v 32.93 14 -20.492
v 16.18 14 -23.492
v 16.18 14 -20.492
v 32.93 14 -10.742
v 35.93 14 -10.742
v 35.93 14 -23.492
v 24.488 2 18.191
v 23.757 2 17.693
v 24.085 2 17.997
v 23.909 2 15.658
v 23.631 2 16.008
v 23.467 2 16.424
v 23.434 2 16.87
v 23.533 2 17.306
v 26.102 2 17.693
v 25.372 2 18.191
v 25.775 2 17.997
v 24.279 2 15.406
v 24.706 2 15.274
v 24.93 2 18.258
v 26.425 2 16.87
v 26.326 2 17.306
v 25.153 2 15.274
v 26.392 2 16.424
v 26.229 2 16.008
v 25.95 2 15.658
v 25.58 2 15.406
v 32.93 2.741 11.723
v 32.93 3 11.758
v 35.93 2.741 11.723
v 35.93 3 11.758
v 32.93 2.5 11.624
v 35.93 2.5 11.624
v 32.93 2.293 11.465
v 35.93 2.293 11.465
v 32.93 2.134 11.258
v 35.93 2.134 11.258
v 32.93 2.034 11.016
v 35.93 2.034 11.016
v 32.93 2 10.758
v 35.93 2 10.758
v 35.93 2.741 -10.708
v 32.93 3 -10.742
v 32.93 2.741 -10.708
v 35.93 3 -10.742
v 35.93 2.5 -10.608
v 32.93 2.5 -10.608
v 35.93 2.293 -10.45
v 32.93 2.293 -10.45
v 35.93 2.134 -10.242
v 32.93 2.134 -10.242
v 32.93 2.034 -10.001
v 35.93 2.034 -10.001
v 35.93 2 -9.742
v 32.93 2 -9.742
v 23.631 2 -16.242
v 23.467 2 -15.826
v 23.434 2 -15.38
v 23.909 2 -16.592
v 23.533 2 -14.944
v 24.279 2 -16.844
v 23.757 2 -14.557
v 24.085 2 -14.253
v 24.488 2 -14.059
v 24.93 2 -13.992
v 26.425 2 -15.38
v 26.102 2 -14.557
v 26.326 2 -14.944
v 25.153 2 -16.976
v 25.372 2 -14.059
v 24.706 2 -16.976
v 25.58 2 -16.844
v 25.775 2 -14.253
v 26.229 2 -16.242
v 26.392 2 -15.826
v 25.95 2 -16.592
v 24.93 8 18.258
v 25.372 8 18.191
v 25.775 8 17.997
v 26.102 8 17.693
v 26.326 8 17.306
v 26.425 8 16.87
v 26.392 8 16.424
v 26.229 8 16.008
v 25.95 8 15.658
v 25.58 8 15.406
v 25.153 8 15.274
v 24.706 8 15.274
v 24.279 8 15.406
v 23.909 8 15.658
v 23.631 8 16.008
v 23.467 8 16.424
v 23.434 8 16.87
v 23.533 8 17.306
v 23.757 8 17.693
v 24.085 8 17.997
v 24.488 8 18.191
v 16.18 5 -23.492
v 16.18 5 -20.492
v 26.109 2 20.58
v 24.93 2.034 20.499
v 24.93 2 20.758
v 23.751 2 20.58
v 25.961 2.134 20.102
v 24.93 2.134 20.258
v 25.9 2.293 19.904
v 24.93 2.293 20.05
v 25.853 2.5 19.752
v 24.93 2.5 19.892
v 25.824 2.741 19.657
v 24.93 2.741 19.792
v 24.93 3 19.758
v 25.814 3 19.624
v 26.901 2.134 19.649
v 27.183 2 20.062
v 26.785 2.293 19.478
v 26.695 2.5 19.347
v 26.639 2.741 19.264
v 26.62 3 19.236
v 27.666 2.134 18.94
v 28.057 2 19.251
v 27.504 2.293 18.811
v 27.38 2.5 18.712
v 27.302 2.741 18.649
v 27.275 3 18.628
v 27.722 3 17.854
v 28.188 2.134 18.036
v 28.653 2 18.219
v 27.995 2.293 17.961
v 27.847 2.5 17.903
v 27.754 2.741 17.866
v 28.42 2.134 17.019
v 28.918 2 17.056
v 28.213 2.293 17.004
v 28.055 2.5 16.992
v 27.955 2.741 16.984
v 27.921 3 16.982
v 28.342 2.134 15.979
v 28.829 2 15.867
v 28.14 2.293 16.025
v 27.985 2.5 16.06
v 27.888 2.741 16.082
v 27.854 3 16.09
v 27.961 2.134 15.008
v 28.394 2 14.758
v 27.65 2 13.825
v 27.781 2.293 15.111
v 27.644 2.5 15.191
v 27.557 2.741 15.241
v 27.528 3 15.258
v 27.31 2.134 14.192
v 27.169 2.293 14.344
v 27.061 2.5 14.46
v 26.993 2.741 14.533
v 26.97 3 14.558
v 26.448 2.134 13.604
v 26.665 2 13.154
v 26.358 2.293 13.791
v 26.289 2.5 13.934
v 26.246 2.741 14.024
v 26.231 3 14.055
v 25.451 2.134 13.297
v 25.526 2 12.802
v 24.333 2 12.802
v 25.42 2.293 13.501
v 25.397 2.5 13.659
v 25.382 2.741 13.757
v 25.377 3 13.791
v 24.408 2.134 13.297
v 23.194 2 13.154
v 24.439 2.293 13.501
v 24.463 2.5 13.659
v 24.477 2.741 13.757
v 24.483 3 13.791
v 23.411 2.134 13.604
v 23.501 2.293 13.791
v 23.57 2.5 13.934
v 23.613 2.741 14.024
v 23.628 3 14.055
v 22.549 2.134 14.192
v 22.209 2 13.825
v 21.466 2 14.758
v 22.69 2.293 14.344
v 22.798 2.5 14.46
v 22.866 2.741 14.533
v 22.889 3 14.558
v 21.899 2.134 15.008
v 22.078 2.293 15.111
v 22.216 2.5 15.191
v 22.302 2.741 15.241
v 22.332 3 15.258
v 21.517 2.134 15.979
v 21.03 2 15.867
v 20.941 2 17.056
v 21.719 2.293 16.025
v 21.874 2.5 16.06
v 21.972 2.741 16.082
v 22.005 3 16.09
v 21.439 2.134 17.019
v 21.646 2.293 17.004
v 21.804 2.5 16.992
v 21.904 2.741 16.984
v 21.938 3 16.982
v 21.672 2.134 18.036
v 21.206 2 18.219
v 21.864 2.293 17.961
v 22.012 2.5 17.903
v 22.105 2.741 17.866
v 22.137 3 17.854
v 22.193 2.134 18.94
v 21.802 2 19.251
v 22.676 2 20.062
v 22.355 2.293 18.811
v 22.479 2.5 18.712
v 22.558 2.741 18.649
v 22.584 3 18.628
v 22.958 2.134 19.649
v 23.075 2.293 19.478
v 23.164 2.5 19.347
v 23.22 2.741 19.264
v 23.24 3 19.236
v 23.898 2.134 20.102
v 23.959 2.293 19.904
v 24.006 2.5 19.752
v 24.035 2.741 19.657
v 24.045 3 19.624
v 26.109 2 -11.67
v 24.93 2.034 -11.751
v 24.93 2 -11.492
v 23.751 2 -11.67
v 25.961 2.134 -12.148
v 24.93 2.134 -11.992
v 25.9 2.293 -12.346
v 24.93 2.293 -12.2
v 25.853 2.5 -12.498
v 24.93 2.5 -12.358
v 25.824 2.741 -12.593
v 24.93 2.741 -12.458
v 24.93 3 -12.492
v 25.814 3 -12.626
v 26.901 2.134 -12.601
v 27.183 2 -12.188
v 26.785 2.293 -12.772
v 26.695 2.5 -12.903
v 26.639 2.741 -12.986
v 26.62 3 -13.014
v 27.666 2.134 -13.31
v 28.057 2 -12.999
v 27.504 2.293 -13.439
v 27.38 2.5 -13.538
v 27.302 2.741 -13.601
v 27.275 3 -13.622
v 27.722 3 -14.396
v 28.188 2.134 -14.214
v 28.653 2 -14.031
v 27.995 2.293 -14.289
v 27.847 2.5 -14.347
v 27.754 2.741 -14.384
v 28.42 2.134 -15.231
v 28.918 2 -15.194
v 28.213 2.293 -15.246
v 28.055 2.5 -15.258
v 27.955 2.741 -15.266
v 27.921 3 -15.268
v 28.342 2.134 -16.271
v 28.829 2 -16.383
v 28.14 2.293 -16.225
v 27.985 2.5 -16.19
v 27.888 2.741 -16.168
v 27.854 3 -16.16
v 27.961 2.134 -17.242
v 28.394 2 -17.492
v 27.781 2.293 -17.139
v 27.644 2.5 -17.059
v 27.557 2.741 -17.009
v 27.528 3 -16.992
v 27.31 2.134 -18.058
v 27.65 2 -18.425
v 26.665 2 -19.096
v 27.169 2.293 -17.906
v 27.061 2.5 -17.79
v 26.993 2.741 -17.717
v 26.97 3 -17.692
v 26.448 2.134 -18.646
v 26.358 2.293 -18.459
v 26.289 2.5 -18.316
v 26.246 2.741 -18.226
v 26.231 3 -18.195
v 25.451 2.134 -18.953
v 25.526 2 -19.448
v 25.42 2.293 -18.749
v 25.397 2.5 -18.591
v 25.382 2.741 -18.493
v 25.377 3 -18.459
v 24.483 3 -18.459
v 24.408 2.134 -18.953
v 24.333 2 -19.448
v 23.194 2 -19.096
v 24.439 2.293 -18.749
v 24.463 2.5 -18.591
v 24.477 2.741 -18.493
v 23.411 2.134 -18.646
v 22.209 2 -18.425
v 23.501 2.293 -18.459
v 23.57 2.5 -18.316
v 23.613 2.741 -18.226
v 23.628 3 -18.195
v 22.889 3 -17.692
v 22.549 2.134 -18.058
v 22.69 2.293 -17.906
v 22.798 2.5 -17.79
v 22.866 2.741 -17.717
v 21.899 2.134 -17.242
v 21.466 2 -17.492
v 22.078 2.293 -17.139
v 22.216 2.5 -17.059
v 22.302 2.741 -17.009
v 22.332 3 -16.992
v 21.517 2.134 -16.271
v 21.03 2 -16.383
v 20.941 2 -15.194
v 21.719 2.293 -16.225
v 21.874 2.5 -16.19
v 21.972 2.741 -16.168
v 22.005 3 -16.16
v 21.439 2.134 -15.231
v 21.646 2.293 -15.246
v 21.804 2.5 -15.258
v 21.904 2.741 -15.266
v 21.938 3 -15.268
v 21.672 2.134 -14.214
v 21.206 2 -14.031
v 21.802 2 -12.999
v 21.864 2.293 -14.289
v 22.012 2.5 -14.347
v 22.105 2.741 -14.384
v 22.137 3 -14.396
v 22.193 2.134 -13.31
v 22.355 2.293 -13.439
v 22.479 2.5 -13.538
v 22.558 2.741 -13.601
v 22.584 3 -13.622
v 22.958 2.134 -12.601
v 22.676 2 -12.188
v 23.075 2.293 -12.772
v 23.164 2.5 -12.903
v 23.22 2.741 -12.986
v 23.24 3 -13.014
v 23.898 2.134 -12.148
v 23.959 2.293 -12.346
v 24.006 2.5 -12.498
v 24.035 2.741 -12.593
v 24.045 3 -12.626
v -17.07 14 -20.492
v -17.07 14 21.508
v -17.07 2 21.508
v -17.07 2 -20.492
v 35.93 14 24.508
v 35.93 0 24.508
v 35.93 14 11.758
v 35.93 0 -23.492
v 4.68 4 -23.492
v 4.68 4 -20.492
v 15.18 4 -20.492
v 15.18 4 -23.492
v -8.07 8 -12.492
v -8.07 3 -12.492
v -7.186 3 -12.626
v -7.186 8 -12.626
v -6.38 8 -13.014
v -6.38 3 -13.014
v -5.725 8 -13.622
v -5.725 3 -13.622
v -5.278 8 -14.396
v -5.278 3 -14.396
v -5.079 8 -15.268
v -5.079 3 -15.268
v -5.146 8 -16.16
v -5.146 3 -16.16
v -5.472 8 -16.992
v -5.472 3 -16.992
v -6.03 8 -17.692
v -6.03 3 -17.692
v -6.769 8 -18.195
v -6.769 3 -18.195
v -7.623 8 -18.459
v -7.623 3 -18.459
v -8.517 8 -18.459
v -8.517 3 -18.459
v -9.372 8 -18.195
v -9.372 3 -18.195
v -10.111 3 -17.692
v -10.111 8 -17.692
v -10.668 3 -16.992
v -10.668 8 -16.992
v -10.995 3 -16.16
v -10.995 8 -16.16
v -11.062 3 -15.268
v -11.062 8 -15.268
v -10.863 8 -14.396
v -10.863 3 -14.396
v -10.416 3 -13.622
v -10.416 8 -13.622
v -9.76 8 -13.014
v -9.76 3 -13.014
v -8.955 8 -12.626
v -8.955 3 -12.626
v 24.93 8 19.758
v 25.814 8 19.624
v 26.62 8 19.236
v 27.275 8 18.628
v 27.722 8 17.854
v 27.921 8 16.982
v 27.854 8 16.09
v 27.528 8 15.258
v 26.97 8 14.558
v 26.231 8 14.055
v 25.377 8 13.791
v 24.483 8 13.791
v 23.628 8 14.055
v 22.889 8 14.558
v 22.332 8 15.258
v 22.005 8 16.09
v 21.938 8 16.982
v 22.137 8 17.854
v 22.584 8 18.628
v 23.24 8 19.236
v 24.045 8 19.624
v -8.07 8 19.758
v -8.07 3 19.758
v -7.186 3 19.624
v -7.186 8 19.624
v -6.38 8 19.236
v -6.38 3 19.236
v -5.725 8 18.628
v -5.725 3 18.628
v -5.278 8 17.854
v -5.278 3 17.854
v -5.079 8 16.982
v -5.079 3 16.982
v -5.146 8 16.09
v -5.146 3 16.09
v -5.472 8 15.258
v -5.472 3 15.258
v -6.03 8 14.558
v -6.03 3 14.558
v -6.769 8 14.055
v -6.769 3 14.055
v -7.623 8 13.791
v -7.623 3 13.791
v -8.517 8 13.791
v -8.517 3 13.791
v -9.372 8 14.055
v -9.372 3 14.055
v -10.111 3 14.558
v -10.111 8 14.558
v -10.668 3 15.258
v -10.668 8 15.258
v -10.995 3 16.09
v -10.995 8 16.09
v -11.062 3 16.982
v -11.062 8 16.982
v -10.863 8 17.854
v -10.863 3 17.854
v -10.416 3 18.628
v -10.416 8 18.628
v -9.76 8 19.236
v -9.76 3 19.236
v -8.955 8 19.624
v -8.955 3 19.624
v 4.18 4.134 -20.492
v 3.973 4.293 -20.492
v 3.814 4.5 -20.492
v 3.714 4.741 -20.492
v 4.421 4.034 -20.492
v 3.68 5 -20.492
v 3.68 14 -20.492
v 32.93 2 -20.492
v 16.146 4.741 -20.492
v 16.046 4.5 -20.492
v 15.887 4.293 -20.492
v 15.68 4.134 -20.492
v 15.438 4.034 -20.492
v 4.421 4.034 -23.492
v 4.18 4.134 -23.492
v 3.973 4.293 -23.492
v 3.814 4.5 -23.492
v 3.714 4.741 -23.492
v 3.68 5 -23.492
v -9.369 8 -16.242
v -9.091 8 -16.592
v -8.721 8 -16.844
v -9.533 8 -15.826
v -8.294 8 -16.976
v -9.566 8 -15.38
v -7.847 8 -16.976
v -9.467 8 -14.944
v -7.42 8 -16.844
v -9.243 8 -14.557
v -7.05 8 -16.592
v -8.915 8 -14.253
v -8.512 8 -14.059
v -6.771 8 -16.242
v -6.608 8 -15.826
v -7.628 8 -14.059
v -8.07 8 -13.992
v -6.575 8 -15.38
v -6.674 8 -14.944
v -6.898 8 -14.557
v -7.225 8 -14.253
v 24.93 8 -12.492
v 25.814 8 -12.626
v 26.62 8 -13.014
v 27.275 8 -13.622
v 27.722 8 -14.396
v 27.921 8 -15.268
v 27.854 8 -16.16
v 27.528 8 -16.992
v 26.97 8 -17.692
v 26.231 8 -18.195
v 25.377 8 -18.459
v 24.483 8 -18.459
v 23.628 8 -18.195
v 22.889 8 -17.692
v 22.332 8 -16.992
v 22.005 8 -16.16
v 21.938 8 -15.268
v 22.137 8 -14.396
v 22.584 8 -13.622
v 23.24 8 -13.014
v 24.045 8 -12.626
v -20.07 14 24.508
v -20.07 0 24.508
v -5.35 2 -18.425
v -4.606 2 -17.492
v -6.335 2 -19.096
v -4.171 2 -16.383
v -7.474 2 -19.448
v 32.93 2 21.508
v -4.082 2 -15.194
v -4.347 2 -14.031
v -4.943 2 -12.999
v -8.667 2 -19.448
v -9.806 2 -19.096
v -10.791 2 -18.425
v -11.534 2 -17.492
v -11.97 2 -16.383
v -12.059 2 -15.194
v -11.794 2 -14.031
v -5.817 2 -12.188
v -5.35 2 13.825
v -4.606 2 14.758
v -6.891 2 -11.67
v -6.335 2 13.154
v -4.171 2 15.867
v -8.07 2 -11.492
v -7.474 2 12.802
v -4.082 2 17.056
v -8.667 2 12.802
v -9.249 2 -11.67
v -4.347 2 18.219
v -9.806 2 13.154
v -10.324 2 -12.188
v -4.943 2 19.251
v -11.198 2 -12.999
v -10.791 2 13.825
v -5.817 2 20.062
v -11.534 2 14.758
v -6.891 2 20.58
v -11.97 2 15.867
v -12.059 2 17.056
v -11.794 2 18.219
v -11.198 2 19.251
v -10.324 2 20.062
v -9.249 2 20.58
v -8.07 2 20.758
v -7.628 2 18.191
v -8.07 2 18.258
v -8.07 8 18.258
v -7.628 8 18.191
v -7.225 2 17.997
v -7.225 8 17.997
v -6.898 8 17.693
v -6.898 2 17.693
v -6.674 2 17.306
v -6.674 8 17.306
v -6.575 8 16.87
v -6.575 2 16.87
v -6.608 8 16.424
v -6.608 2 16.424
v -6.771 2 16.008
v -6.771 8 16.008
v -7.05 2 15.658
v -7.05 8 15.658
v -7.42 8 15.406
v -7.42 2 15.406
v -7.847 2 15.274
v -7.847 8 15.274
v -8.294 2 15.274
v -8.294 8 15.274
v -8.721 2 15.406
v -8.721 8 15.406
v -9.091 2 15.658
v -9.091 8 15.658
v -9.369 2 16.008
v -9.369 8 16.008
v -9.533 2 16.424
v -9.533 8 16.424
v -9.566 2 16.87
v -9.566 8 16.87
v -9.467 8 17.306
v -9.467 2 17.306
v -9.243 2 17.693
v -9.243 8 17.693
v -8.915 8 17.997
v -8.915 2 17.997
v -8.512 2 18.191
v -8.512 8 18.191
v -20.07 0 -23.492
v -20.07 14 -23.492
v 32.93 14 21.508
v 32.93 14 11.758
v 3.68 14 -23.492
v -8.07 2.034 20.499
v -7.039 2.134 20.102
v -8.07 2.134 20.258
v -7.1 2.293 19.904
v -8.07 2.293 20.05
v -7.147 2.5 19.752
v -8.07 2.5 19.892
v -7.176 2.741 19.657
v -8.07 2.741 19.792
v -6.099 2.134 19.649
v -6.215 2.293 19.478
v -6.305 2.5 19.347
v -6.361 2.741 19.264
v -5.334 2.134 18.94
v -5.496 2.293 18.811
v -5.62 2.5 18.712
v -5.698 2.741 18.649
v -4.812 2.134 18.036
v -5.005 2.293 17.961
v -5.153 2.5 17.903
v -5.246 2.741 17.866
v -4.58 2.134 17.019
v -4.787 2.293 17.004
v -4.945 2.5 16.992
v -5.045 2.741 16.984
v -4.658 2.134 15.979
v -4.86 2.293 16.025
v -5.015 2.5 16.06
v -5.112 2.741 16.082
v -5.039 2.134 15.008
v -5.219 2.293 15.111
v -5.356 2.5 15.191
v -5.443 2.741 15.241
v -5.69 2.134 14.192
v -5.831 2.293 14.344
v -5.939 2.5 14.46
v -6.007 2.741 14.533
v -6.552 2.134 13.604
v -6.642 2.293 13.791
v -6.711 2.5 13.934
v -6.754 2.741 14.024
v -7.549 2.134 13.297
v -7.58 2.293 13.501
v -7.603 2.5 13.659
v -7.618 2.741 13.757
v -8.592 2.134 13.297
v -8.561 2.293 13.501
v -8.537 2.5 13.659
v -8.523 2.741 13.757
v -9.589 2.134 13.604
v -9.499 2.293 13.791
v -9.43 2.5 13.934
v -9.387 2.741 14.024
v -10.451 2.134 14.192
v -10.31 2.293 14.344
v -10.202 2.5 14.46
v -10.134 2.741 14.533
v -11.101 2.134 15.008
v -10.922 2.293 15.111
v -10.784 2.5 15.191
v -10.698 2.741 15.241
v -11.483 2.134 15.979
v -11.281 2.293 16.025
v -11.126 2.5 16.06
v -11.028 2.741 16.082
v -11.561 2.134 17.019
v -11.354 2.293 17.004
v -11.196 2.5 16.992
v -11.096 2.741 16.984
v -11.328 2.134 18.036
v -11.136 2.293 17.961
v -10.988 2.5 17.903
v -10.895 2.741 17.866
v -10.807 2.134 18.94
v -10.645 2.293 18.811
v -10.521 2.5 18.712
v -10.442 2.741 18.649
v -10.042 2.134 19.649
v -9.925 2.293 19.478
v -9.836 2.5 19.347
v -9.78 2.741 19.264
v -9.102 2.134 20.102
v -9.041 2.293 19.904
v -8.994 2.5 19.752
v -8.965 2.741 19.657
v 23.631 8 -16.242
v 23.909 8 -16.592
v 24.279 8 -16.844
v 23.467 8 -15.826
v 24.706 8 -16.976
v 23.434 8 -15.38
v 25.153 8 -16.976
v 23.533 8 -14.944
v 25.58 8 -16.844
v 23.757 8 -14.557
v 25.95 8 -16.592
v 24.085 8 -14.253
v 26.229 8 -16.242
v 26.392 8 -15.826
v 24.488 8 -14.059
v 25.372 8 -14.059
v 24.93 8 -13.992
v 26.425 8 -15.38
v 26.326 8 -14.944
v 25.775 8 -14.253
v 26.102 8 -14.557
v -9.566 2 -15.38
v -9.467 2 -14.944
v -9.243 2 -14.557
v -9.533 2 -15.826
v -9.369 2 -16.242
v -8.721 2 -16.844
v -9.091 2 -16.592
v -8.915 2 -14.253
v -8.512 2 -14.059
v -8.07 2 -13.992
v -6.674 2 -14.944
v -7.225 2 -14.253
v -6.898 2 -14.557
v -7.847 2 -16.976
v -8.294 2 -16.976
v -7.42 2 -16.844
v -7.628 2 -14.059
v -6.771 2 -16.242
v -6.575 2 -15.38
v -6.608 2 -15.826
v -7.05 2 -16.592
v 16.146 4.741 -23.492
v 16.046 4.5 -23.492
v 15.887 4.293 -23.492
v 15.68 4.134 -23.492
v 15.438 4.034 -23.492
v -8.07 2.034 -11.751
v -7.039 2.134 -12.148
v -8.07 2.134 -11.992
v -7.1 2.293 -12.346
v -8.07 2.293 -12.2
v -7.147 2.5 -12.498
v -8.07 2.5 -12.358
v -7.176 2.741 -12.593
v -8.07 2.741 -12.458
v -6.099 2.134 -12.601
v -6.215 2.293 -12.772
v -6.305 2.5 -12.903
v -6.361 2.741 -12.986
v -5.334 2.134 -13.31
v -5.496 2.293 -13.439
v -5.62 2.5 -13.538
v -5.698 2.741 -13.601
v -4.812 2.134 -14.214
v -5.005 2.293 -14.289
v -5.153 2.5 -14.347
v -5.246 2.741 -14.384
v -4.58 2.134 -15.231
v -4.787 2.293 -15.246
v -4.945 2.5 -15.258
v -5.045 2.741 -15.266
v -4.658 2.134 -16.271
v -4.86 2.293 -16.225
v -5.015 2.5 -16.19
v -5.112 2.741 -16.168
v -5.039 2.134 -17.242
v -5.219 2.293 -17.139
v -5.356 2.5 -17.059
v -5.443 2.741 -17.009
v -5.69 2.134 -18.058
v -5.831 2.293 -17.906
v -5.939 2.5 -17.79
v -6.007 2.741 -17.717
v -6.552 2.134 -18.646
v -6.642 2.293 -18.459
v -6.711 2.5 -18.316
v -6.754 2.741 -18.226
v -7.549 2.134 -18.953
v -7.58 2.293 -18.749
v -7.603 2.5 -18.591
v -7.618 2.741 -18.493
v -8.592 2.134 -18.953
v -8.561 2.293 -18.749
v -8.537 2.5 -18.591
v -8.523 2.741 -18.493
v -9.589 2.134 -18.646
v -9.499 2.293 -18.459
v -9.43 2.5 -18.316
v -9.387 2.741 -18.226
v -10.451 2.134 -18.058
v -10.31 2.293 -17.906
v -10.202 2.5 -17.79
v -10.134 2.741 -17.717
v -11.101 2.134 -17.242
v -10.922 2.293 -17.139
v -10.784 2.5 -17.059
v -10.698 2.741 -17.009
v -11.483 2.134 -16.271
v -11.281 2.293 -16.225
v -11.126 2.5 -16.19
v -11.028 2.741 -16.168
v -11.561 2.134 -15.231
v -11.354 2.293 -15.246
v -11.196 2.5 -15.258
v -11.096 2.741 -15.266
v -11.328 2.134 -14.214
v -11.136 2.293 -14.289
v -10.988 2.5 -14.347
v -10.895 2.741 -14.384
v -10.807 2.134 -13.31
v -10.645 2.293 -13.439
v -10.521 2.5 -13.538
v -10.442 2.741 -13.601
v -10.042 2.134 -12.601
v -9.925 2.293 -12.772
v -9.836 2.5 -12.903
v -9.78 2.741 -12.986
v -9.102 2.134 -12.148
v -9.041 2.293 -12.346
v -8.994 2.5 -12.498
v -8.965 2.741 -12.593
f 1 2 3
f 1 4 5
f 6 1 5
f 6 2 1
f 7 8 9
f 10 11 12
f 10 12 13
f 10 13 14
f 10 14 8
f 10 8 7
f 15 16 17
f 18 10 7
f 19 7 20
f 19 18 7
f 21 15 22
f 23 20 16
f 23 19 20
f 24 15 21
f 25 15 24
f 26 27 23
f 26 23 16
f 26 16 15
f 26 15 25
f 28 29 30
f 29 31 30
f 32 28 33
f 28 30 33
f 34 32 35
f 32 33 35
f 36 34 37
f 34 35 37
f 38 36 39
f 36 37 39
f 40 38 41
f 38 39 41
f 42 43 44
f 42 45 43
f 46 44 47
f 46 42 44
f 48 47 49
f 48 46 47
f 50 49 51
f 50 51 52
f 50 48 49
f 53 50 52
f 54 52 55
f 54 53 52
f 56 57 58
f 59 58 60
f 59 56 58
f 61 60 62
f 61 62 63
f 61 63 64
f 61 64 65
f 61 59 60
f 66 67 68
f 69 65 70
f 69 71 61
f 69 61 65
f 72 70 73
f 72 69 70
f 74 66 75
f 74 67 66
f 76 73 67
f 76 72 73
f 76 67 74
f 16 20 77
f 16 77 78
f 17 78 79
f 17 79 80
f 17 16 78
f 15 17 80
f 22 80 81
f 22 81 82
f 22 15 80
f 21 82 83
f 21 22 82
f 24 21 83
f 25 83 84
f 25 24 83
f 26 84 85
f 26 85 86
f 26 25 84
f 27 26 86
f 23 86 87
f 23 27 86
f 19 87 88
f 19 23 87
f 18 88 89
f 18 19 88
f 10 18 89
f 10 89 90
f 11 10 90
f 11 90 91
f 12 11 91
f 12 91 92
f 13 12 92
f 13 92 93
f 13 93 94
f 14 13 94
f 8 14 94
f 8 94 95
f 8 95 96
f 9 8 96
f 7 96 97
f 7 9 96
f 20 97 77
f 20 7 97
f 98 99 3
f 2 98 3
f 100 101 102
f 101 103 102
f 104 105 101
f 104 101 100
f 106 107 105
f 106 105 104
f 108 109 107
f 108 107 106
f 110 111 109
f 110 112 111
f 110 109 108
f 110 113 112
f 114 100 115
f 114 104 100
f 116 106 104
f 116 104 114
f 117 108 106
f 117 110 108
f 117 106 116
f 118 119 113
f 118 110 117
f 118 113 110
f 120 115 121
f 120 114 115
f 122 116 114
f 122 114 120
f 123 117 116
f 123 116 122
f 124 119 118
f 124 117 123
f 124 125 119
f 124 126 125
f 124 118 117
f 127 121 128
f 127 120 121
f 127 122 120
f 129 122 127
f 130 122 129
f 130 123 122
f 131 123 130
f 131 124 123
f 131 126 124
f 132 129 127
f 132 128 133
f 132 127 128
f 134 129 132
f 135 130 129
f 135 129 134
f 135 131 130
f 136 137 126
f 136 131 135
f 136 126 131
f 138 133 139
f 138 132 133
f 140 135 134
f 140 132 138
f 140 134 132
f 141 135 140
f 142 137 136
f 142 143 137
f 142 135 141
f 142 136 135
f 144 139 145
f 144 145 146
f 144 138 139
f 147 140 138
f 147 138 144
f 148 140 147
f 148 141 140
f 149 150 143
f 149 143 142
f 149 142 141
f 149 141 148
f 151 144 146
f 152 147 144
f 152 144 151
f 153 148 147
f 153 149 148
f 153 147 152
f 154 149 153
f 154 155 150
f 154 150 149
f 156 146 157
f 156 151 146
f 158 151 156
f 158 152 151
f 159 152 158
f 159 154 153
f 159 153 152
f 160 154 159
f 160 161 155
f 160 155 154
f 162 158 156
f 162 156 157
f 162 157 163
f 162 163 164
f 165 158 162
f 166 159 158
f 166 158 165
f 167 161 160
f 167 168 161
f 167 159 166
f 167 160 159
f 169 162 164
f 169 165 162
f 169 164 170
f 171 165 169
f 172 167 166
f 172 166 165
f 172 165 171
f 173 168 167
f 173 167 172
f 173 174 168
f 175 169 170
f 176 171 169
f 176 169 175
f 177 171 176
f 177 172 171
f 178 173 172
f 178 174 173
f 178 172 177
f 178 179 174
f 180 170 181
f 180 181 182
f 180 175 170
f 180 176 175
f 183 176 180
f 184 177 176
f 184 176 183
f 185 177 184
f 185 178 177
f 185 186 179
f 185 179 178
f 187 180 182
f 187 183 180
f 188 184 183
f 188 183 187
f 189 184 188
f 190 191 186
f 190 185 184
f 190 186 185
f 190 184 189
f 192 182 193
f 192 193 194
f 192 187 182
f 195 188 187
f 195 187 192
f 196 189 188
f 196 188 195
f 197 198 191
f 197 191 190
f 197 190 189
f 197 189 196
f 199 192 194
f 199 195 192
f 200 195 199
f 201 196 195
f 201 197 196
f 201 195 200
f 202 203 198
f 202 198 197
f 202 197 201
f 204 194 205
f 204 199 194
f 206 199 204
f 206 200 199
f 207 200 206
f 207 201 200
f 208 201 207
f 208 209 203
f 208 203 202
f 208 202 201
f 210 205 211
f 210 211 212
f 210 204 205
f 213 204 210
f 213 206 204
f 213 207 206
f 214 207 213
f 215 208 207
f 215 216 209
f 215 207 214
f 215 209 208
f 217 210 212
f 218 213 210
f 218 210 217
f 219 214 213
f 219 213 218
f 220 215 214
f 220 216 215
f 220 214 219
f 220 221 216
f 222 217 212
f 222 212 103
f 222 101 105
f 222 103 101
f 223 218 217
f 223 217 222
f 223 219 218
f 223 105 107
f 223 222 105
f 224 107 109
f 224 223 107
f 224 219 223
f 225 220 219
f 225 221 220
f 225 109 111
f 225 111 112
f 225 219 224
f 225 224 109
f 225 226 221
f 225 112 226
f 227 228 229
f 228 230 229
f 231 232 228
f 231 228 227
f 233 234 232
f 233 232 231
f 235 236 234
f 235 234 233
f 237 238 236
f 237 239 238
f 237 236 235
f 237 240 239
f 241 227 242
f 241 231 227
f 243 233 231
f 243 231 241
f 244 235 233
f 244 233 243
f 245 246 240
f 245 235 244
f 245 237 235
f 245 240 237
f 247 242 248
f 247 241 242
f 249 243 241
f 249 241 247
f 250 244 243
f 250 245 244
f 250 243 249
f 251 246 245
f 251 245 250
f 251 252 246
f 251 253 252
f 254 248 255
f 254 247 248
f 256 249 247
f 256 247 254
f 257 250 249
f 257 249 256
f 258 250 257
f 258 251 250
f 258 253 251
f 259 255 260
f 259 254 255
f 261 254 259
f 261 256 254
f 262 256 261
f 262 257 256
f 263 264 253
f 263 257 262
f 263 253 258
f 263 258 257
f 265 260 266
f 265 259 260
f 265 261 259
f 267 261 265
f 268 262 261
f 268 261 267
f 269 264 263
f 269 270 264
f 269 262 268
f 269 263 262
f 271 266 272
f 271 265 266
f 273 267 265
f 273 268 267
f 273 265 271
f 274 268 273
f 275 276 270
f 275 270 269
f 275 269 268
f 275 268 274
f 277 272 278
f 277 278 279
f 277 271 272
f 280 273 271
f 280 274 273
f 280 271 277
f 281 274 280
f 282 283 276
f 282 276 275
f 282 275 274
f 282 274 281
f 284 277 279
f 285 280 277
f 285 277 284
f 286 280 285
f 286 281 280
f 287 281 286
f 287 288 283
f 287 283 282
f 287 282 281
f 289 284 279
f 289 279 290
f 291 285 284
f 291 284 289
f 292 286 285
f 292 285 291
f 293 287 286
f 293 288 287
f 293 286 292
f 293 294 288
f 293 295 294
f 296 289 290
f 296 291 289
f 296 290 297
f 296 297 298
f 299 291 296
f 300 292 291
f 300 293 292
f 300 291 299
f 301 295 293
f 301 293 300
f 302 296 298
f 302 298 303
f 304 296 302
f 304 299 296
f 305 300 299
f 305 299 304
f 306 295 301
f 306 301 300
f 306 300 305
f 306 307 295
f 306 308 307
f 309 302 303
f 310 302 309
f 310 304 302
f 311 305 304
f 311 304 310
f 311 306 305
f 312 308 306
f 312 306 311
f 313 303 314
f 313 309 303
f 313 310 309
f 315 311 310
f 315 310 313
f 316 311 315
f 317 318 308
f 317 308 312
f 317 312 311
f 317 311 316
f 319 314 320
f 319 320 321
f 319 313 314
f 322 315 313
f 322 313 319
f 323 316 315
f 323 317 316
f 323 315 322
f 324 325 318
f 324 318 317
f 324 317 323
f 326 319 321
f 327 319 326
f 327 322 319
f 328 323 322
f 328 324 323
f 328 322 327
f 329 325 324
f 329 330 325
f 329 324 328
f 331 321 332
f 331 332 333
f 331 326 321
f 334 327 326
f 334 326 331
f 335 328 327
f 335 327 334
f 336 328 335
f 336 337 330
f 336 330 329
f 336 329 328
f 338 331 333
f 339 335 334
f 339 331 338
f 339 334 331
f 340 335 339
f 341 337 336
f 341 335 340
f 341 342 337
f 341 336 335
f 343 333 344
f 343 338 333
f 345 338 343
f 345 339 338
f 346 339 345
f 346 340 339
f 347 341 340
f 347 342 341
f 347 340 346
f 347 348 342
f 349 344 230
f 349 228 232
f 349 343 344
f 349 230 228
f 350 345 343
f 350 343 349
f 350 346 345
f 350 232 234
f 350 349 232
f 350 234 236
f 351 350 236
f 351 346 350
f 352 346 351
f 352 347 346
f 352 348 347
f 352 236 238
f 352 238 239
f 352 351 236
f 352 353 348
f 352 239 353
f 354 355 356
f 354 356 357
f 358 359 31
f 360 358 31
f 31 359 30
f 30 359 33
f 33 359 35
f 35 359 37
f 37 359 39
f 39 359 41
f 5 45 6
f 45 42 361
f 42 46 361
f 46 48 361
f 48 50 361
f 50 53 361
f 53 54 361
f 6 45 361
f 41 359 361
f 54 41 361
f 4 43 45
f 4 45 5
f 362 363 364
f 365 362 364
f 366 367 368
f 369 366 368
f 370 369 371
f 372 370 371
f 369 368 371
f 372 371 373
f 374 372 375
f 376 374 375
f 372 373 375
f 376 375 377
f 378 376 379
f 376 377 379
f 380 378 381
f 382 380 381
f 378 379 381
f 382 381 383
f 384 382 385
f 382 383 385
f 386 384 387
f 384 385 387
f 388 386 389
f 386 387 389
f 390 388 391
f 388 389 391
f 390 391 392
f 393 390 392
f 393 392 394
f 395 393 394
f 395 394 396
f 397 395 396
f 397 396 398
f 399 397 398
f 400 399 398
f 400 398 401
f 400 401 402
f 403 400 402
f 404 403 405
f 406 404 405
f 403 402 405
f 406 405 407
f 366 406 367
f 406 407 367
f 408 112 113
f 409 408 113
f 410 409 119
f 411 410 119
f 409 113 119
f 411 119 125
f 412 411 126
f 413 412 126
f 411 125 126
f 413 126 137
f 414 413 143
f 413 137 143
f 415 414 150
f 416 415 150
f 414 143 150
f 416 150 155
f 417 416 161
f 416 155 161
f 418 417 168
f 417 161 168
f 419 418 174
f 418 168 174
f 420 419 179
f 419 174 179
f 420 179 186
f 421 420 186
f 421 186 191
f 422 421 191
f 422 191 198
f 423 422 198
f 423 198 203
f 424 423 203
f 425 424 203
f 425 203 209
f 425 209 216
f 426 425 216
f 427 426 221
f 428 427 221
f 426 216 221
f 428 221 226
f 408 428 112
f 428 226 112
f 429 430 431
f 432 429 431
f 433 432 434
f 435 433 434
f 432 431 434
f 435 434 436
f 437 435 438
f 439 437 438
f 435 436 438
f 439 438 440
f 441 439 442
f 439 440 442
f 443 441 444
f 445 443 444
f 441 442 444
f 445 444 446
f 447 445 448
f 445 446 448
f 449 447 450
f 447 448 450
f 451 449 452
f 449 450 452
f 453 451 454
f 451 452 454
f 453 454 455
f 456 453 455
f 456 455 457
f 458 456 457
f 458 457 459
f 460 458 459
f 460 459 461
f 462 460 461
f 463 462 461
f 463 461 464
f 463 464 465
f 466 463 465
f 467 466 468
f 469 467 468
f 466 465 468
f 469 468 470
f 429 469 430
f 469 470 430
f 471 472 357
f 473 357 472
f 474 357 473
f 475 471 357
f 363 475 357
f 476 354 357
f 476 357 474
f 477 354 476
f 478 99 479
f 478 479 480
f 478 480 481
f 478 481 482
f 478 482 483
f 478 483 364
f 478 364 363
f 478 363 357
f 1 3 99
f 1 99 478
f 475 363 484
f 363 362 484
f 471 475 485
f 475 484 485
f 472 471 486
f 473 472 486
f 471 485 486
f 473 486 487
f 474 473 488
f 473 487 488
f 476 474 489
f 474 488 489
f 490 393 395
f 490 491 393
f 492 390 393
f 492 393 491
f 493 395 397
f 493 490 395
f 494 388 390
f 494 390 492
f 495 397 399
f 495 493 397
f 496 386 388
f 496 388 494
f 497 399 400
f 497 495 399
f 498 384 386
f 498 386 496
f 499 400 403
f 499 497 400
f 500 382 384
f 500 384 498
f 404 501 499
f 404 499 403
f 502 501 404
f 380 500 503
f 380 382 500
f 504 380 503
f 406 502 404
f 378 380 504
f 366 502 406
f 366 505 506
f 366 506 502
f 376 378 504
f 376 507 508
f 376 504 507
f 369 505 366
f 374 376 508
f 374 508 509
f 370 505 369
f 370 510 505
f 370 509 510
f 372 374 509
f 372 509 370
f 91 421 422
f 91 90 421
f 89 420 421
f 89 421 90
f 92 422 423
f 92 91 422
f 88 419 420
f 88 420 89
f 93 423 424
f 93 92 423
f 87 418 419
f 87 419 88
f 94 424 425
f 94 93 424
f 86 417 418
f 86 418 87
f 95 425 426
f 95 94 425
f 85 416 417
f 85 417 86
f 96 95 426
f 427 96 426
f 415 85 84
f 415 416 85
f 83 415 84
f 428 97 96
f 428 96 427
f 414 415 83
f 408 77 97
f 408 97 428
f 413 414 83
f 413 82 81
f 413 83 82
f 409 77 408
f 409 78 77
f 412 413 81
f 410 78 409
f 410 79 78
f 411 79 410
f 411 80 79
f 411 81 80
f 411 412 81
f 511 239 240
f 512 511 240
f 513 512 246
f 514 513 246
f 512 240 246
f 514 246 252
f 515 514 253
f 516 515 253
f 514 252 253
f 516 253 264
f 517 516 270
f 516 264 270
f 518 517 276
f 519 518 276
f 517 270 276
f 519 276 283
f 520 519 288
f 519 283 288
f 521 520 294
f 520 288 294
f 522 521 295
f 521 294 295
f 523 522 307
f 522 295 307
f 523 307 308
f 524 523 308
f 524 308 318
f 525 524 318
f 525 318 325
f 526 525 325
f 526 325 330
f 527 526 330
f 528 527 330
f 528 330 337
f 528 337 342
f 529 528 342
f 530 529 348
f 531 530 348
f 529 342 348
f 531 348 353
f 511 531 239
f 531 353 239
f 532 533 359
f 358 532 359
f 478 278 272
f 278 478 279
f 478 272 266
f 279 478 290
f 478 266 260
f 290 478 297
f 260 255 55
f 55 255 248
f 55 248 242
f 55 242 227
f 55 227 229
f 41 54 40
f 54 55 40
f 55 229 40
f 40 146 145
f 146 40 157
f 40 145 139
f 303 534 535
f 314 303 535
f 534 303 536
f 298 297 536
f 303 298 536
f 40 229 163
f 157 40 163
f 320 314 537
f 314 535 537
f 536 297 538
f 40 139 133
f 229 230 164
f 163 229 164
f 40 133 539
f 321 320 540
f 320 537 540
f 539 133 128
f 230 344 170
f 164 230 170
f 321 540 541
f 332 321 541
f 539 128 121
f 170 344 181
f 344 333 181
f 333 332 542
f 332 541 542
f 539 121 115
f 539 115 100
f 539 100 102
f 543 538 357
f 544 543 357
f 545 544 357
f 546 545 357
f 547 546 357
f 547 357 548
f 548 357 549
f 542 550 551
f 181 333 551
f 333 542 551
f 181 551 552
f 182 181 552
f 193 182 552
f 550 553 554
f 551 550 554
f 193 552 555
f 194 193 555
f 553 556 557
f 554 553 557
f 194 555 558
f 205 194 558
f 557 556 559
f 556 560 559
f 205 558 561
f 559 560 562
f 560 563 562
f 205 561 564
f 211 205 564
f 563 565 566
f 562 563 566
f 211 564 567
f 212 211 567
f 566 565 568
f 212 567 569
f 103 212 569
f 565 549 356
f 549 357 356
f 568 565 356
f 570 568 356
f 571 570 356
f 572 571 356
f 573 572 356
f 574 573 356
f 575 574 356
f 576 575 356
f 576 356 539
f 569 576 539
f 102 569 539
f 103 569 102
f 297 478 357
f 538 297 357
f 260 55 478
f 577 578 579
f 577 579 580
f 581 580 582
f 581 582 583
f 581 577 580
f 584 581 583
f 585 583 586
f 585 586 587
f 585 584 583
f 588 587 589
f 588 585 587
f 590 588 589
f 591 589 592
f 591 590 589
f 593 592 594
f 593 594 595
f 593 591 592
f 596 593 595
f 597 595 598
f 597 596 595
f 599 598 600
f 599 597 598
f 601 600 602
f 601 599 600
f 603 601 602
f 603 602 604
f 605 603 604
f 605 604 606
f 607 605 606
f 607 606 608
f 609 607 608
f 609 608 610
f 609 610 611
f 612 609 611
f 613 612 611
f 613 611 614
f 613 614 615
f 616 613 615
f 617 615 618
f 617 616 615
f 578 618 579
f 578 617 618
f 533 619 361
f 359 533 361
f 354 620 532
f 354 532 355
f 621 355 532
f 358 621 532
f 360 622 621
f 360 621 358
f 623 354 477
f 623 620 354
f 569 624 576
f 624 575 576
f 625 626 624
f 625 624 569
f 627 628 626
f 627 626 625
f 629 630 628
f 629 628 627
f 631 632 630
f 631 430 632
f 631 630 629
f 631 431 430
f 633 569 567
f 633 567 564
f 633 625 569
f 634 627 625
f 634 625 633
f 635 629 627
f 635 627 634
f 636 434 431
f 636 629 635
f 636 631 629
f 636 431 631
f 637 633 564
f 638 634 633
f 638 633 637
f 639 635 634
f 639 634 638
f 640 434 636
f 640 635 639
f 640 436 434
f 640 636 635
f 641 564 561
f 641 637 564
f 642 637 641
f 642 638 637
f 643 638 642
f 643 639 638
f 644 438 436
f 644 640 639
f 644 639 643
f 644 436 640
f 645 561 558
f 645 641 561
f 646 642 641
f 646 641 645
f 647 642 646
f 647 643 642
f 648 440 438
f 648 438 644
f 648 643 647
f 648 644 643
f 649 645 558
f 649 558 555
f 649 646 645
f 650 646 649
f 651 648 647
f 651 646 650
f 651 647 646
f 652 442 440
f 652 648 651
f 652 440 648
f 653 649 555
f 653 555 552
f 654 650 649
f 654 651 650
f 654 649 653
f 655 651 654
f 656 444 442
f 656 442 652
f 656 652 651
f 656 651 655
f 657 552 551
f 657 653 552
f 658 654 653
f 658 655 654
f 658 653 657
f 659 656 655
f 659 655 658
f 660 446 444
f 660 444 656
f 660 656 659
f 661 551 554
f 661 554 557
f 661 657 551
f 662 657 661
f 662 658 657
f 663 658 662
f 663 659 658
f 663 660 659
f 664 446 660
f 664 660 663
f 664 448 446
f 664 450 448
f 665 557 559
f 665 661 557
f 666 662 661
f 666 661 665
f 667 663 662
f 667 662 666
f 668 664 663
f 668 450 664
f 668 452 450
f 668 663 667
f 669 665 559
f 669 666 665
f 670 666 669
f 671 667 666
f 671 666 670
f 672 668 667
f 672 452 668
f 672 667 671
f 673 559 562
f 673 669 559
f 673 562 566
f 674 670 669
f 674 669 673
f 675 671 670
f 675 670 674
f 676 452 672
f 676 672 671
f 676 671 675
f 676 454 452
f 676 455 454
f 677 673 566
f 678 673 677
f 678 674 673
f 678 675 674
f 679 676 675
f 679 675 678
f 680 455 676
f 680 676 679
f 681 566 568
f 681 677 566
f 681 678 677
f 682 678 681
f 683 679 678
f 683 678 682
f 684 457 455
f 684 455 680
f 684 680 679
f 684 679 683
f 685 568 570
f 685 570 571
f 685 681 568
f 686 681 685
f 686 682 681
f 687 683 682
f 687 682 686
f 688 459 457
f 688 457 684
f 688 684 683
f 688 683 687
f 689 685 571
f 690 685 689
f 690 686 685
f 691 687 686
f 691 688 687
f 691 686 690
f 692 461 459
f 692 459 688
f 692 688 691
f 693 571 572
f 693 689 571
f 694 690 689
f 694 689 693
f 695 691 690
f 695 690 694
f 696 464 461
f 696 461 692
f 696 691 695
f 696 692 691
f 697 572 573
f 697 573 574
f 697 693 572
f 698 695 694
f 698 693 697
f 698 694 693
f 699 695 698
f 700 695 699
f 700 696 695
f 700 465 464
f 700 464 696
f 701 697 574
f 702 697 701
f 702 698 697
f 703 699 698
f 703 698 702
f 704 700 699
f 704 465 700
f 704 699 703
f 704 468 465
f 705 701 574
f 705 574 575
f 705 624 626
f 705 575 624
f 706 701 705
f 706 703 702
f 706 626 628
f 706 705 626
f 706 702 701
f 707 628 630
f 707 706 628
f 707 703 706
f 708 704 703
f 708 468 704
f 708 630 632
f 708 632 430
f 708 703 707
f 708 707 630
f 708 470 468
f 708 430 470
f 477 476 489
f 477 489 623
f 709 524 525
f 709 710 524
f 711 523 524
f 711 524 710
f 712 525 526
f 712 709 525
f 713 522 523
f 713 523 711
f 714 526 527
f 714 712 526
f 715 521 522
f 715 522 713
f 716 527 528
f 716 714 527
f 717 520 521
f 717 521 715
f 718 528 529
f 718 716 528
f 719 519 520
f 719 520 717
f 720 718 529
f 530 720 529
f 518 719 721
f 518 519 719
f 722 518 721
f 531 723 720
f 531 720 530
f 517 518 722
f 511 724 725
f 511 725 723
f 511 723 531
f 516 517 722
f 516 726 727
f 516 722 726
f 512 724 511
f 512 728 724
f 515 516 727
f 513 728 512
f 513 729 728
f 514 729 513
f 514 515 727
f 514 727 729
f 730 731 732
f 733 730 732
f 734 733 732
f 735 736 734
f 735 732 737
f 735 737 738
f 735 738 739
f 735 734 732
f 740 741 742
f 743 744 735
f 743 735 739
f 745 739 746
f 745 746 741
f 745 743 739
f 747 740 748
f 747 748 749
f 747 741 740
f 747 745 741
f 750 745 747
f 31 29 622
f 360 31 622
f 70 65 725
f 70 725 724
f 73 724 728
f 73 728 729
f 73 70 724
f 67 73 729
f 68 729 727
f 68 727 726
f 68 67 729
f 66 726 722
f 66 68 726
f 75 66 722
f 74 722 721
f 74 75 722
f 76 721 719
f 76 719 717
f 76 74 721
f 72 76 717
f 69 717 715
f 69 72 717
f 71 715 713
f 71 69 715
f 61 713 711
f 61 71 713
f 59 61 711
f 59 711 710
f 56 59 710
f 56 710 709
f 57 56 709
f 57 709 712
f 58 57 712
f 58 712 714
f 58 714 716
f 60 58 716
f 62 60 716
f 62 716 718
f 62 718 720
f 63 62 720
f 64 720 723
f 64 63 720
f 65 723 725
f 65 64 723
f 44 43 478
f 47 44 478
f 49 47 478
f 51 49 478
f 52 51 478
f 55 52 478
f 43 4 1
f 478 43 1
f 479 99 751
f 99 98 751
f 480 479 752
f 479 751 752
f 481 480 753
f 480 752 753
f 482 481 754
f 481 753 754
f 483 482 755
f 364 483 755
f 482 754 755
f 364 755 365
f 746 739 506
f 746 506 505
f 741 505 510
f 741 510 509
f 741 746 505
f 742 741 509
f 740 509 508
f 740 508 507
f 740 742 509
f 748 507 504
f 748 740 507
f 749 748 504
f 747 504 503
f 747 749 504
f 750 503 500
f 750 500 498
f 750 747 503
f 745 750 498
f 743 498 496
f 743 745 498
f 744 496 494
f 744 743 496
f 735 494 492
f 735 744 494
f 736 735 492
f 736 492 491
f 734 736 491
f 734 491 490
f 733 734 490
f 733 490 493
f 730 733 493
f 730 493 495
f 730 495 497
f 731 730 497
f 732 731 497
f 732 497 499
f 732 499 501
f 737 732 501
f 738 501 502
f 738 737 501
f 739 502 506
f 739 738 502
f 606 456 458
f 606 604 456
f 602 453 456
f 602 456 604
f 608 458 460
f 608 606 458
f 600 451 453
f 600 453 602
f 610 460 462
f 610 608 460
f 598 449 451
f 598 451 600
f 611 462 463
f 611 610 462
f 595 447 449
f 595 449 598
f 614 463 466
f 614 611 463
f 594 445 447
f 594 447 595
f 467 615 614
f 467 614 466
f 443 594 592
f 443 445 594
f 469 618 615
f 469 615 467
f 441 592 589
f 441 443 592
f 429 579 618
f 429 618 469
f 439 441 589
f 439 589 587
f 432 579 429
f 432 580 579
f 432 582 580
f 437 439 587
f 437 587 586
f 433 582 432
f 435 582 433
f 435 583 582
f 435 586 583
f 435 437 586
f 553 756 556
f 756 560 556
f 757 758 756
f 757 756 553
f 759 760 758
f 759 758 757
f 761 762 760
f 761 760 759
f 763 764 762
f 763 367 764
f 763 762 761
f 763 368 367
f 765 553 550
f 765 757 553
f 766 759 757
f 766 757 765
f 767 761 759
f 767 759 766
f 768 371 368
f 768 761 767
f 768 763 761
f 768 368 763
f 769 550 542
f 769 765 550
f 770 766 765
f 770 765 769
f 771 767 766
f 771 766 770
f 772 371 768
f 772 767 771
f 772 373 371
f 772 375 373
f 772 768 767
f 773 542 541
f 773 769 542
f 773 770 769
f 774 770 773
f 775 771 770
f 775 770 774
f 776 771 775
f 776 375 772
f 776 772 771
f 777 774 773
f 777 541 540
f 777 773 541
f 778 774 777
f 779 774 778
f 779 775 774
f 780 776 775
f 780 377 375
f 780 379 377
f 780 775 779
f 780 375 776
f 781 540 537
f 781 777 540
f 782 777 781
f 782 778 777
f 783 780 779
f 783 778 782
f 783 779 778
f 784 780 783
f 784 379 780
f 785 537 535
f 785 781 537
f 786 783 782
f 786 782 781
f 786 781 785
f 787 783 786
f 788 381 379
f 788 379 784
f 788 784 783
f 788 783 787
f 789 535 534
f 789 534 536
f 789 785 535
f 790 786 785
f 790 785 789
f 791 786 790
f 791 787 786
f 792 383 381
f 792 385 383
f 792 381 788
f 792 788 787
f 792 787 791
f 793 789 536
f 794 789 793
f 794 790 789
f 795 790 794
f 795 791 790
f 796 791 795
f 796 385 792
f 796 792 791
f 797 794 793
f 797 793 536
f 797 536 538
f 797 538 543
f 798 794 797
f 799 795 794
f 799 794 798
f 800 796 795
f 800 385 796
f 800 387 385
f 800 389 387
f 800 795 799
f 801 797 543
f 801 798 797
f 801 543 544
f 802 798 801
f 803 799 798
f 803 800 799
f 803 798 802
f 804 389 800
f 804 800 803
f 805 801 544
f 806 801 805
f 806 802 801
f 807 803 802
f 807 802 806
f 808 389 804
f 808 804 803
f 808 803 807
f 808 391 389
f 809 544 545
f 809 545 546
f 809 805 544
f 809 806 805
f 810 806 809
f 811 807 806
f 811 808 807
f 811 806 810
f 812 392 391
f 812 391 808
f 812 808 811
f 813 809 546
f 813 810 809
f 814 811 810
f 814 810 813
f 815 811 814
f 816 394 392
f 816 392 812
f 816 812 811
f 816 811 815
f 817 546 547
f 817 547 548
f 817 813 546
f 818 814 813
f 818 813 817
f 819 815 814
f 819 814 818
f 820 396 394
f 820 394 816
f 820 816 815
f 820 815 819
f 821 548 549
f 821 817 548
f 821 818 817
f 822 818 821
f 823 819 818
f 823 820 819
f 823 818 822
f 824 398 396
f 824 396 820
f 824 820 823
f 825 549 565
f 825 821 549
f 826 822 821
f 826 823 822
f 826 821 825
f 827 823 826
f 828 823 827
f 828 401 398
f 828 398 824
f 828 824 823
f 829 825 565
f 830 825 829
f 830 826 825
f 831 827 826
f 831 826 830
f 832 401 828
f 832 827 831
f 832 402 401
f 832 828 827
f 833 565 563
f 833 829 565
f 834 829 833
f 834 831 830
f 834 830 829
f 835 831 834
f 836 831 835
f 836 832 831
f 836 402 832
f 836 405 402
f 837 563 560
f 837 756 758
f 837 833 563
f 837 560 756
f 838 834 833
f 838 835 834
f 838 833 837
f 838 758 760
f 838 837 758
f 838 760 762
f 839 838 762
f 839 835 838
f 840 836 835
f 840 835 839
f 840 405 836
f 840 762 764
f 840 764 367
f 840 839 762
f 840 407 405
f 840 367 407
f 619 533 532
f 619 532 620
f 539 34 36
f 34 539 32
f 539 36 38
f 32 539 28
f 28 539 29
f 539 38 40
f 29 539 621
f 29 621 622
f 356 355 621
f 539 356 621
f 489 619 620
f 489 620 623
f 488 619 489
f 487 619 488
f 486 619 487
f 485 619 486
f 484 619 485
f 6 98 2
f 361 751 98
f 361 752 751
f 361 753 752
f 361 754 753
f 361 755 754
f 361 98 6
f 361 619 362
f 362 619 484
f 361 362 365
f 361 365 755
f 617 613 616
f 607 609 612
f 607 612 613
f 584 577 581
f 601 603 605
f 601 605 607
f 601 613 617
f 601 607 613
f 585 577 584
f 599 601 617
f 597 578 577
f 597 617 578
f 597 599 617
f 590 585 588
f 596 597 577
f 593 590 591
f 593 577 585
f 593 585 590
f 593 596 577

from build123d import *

# Parameters (mm, degrees)
SKETCH1_W           = 56
SKETCH1_H           = 48
BOSS_EXTRUDE1_DEPTH = 14
SKETCH3_W           = 50
SKETCH3_H           = 42
CUT_EXTRUDE1_DEPTH  = 12
SKETCH4_R           = 3
SKETCH4_R_2         = 1.5
BOSS_EXTRUDE2_DEPTH = 6
SKETCH5_W           = 22.5
SKETCH5_H           = 12
CUT_EXTRUDE2_DEPTH  = 3
SKETCH6_W           = 12.5
SKETCH6_H           = 10
CUT_EXTRUDE3_DEPTH  = 3
FILLET1_R           = 1
FILLET2_R           = 1


with BuildPart() as part:
    # Sketch1 → Boss-Extrude1 (new body)
    with BuildSketch(Plane(origin=(0, 0, 0), x_dir=(1, 0, 0), z_dir=(0, 1, 0))):
        with Locations((7.929648241, -0.507537688)):
            Rectangle(SKETCH1_W, SKETCH1_H)
    extrude(amount=BOSS_EXTRUDE1_DEPTH)

    # Sketch3 → Cut-Extrude1 (cut)
    with BuildSketch(Plane(origin=(0, 14, 0), x_dir=(1, 0, 0), z_dir=(0, 1, 0))):
        with Locations((7.929648241, -0.507537688)):
            Rectangle(SKETCH3_W, SKETCH3_H)
    extrude(amount=-CUT_EXTRUDE1_DEPTH, mode=Mode.SUBTRACT)

    # Sketch4 → Boss-Extrude2 (add)
    # profile 1 of 4: a face of its own
    with BuildSketch(Plane(origin=(0, 2, 0), x_dir=(1, 0, 0), z_dir=(0, 1, 0))):
        with Locations(Location((-8.070351759, 15.492462312, 0), (0, 0, 270))):
            Circle(SKETCH4_R)
        with Locations(Location((-8.070351759, 15.492462312, 0), (0, 0, 270))):
            Circle(SKETCH4_R_2, mode=Mode.SUBTRACT)
    # profile 2 of 4: a face of its own
    with BuildSketch(Plane(origin=(0, 2, 0), x_dir=(1, 0, 0), z_dir=(0, 1, 0))):
        with Locations(Location((24.929648241, 15.492462312, 0), (0, 0, 270))):
            Circle(SKETCH4_R)
        with Locations(Location((24.929648241, 15.492462312, 0), (0, 0, 270))):
            Circle(SKETCH4_R_2, mode=Mode.SUBTRACT)
    # profile 3 of 4: a face of its own
    with BuildSketch(Plane(origin=(0, 2, 0), x_dir=(1, 0, 0), z_dir=(0, 1, 0))):
        with Locations(Location((24.929648241, -16.757537688, 0), (0, 0, 270))):
            Circle(SKETCH4_R)
        with Locations(Location((24.929648241, -16.757537688, 0), (0, 0, 270))):
            Circle(SKETCH4_R_2, mode=Mode.SUBTRACT)
    # profile 4 of 4: a face of its own
    with BuildSketch(Plane(origin=(0, 2, 0), x_dir=(1, 0, 0), z_dir=(0, 1, 0))):
        with Locations(Location((-8.070351759, -16.757537688, 0), (0, 0, 270))):
            Circle(SKETCH4_R)
        with Locations(Location((-8.070351759, -16.757537688, 0), (0, 0, 270))):
            Circle(SKETCH4_R_2, mode=Mode.SUBTRACT)
    extrude(amount=BOSS_EXTRUDE2_DEPTH)

    # Sketch5 → Cut-Extrude2 (cut)
    with BuildSketch(Plane.ZY.offset(-32.929648241)):
        with Locations((0.507537688, 8)):
            Rectangle(SKETCH5_W, SKETCH5_H)
    extrude(amount=-CUT_EXTRUDE2_DEPTH, mode=Mode.SUBTRACT)

    # Sketch6 → Cut-Extrude3 (cut)
    with BuildSketch(Plane.XY.offset(-20.492462312)):
        with Locations((9.929648241, 9)):
            Rectangle(SKETCH6_W, SKETCH6_H)
    extrude(amount=-CUT_EXTRUDE3_DEPTH, mode=Mode.SUBTRACT)

    # Fillet1
    fillet1_edges = [part.edges().sort_by_distance(p)[0] for p in [
        (34.429648241, 2, -10.742462312),
        (34.429648241, 2, 11.757537688),
        (3.679648241, 4, -21.992462312),
        (16.179648241, 4, -21.992462312),
    ]]
    fillet(fillet1_edges, radius=FILLET1_R)

    # Fillet2
    fillet2_edges = [part.edges().sort_by_distance(p)[0] for p in [
        (-8.070351759, 2, -18.492462312),
        (24.929648241, 2, -18.492462312),
        (24.929648241, 2, 13.757537688),
        (-8.070351759, 2, 13.757537688),
    ]]
    fillet(fillet2_edges, radius=FILLET2_R)


solid = part.part
